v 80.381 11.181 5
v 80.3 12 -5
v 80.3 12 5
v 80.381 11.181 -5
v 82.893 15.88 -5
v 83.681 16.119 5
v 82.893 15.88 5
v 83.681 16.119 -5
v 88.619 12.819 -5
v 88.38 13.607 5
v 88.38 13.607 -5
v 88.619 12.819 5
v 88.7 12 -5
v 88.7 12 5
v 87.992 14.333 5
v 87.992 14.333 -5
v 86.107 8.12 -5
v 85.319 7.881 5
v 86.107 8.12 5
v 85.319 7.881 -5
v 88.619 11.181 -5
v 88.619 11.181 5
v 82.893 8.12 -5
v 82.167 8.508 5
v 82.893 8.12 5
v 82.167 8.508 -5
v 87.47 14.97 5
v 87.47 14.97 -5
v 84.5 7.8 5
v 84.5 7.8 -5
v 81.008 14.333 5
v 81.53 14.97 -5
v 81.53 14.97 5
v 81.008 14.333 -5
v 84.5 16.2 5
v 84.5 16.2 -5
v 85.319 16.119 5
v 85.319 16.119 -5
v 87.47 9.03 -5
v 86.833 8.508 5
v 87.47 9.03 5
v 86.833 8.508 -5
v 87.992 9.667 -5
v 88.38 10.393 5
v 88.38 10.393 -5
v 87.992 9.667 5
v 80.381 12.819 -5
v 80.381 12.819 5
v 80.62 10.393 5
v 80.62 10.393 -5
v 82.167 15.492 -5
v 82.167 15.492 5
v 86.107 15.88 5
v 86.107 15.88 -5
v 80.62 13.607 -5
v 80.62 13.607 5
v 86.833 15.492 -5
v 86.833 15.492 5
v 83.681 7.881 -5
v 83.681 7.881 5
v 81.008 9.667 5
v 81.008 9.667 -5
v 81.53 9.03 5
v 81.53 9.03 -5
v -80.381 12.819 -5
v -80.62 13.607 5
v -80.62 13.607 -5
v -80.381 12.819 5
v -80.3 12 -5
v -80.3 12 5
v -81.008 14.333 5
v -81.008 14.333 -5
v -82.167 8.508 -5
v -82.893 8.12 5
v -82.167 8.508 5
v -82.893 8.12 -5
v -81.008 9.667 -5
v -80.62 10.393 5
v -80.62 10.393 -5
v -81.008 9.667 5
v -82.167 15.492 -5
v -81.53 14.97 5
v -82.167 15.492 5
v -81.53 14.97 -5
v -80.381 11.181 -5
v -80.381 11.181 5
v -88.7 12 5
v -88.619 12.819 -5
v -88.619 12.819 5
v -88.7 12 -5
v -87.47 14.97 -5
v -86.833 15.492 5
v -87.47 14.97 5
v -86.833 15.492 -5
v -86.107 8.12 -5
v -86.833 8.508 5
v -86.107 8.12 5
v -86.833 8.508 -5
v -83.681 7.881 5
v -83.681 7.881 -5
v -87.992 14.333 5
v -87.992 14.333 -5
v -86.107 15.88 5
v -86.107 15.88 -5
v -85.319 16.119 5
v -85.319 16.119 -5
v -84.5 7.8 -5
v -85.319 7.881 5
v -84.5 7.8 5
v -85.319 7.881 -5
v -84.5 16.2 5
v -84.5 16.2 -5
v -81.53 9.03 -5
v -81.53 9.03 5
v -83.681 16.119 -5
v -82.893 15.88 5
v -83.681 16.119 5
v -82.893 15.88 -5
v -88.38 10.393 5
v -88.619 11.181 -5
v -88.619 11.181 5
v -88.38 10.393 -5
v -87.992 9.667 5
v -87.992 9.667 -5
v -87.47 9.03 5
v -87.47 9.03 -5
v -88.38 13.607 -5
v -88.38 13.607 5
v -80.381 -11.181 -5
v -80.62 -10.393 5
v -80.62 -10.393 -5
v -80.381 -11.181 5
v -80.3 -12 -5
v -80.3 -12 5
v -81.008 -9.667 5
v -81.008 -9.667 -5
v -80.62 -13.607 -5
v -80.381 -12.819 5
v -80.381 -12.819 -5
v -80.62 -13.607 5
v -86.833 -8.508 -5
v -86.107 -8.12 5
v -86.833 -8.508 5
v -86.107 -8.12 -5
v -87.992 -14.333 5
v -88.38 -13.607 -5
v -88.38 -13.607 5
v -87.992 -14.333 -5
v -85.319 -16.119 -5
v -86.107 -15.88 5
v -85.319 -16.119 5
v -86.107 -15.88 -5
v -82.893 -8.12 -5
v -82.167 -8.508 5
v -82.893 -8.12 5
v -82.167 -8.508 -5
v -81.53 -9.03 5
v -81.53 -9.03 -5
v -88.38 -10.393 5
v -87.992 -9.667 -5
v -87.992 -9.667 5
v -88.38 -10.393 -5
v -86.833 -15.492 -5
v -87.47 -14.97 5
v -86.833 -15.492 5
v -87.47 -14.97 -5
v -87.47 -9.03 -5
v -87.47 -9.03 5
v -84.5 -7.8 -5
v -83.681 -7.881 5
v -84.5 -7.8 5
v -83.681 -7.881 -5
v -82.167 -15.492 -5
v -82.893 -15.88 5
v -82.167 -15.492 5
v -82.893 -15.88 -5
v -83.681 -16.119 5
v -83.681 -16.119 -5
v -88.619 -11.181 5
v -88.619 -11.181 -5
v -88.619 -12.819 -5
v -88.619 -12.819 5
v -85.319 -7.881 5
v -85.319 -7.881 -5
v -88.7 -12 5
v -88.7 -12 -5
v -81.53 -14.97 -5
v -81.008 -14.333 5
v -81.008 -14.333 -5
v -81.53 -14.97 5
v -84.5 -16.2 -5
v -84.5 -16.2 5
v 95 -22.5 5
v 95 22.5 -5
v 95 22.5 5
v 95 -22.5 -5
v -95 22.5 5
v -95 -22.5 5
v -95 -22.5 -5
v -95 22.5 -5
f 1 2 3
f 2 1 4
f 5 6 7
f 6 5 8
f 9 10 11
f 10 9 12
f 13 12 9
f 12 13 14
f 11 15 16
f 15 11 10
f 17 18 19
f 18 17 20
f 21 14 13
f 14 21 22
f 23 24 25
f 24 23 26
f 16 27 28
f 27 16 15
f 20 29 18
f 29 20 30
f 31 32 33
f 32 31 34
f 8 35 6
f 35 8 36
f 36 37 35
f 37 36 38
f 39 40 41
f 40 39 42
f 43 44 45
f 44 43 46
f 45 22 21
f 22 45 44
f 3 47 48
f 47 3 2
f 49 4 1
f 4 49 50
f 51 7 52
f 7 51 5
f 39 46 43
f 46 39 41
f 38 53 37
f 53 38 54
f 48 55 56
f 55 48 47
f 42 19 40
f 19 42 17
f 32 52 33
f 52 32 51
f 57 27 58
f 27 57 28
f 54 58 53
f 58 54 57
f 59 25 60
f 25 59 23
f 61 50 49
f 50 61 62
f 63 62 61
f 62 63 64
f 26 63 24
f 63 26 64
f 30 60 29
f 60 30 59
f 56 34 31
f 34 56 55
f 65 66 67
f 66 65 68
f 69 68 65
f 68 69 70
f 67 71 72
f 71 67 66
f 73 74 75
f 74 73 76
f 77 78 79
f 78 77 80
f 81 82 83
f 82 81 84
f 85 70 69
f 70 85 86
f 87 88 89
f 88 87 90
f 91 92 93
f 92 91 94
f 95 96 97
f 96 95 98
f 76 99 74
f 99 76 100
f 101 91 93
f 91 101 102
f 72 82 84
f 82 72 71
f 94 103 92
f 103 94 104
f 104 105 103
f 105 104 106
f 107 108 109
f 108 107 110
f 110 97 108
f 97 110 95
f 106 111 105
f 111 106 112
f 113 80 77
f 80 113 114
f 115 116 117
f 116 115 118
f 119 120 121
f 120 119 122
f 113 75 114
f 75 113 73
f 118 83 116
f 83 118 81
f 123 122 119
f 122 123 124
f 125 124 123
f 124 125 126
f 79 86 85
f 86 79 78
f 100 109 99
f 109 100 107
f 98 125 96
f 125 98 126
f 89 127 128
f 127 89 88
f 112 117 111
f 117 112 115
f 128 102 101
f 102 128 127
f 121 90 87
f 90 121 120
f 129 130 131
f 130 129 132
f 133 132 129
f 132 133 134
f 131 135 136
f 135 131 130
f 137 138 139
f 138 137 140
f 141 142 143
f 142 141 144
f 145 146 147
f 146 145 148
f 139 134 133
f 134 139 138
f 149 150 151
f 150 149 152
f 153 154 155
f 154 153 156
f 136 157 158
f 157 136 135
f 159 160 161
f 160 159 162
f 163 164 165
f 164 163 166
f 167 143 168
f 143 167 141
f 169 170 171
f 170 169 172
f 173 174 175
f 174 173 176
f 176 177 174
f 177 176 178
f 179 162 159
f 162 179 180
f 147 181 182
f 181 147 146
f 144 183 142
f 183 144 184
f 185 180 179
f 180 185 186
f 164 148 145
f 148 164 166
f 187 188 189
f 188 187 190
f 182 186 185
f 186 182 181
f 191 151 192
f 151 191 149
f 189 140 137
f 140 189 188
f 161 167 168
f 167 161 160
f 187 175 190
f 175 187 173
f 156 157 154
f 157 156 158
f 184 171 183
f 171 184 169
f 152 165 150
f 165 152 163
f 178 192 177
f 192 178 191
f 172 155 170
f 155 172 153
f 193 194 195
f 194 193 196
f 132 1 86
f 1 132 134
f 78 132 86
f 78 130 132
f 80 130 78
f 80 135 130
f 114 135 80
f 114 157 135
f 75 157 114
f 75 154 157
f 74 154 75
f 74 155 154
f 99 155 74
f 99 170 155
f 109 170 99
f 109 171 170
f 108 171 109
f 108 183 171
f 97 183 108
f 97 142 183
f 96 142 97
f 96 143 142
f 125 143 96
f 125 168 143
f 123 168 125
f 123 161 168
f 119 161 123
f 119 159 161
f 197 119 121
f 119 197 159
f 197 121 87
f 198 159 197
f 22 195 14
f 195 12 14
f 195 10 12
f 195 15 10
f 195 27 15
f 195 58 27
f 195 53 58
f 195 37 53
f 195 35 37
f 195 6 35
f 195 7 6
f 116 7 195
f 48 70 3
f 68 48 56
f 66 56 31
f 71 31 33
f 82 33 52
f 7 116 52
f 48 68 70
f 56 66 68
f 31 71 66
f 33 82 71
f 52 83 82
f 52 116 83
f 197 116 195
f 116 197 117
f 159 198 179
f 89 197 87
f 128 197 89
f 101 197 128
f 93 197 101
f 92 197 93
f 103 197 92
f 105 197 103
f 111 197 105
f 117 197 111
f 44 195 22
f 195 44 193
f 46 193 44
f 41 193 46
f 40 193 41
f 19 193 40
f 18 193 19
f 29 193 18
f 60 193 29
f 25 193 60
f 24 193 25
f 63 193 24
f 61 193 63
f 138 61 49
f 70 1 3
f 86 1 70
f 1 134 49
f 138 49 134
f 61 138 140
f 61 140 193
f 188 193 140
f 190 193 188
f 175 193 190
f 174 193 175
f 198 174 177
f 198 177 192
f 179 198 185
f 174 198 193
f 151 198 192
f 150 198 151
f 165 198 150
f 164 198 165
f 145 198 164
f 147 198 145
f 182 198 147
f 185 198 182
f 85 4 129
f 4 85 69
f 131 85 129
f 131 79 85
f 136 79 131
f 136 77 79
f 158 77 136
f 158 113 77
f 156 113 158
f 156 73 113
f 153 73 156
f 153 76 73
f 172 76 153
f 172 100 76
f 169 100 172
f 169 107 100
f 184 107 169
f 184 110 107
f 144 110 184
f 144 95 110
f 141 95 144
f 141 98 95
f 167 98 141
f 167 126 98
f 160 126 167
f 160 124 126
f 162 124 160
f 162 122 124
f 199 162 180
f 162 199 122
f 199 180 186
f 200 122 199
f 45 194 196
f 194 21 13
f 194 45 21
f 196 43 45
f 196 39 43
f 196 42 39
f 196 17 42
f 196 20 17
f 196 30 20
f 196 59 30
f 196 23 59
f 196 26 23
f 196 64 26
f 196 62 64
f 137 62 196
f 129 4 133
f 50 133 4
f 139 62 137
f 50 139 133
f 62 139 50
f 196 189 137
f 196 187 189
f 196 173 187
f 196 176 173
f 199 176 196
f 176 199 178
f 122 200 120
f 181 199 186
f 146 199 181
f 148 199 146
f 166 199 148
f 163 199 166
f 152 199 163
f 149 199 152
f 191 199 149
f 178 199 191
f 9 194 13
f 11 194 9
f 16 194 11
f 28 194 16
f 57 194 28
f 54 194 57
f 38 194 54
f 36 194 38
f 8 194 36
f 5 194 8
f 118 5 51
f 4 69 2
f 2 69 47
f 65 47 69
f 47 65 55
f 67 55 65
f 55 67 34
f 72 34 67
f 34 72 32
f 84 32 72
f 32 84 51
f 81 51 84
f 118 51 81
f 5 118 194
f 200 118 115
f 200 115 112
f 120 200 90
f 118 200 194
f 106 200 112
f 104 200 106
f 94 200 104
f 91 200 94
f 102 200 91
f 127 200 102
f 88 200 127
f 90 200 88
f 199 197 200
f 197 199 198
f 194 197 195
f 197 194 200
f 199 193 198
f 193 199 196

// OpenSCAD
$fn = 32;

// ----------------------------------------------------------------------
// Corner plate 190 x 45 x 10
// 3 holes, centres taken from the edge offset
// ----------------------------------------------------------------------

// --- parameters (mm) ---
plate = [190, 45, 10];  // overall size (x, y, z)
holes = 3;              // number of holes the drawing asks for
hole_d = 8.4;           // hole diameter
edge = 10.5;            // hole centre offset from the plate edge

// --- derived feature positions (mm) ---
corner_x = plate[0] / 2 - edge;  // = 84.5   corner hole X
corner_y = plate[1] / 2 - edge;  // = 12   corner hole Y
feature_centers = [
  [corner_x, corner_y],
  [-corner_x, corner_y],
  [-corner_x, -corner_y]
];   // hole centres the loop below drills

// plate outline, every hole drilled through with the same cutters
difference() {
  cube(plate, center = true);
  for (centre = feature_centers)
    translate([centre[0], centre[1], 0])
      cylinder(d = hole_d, h = plate[2] + 2, center = true);
}
